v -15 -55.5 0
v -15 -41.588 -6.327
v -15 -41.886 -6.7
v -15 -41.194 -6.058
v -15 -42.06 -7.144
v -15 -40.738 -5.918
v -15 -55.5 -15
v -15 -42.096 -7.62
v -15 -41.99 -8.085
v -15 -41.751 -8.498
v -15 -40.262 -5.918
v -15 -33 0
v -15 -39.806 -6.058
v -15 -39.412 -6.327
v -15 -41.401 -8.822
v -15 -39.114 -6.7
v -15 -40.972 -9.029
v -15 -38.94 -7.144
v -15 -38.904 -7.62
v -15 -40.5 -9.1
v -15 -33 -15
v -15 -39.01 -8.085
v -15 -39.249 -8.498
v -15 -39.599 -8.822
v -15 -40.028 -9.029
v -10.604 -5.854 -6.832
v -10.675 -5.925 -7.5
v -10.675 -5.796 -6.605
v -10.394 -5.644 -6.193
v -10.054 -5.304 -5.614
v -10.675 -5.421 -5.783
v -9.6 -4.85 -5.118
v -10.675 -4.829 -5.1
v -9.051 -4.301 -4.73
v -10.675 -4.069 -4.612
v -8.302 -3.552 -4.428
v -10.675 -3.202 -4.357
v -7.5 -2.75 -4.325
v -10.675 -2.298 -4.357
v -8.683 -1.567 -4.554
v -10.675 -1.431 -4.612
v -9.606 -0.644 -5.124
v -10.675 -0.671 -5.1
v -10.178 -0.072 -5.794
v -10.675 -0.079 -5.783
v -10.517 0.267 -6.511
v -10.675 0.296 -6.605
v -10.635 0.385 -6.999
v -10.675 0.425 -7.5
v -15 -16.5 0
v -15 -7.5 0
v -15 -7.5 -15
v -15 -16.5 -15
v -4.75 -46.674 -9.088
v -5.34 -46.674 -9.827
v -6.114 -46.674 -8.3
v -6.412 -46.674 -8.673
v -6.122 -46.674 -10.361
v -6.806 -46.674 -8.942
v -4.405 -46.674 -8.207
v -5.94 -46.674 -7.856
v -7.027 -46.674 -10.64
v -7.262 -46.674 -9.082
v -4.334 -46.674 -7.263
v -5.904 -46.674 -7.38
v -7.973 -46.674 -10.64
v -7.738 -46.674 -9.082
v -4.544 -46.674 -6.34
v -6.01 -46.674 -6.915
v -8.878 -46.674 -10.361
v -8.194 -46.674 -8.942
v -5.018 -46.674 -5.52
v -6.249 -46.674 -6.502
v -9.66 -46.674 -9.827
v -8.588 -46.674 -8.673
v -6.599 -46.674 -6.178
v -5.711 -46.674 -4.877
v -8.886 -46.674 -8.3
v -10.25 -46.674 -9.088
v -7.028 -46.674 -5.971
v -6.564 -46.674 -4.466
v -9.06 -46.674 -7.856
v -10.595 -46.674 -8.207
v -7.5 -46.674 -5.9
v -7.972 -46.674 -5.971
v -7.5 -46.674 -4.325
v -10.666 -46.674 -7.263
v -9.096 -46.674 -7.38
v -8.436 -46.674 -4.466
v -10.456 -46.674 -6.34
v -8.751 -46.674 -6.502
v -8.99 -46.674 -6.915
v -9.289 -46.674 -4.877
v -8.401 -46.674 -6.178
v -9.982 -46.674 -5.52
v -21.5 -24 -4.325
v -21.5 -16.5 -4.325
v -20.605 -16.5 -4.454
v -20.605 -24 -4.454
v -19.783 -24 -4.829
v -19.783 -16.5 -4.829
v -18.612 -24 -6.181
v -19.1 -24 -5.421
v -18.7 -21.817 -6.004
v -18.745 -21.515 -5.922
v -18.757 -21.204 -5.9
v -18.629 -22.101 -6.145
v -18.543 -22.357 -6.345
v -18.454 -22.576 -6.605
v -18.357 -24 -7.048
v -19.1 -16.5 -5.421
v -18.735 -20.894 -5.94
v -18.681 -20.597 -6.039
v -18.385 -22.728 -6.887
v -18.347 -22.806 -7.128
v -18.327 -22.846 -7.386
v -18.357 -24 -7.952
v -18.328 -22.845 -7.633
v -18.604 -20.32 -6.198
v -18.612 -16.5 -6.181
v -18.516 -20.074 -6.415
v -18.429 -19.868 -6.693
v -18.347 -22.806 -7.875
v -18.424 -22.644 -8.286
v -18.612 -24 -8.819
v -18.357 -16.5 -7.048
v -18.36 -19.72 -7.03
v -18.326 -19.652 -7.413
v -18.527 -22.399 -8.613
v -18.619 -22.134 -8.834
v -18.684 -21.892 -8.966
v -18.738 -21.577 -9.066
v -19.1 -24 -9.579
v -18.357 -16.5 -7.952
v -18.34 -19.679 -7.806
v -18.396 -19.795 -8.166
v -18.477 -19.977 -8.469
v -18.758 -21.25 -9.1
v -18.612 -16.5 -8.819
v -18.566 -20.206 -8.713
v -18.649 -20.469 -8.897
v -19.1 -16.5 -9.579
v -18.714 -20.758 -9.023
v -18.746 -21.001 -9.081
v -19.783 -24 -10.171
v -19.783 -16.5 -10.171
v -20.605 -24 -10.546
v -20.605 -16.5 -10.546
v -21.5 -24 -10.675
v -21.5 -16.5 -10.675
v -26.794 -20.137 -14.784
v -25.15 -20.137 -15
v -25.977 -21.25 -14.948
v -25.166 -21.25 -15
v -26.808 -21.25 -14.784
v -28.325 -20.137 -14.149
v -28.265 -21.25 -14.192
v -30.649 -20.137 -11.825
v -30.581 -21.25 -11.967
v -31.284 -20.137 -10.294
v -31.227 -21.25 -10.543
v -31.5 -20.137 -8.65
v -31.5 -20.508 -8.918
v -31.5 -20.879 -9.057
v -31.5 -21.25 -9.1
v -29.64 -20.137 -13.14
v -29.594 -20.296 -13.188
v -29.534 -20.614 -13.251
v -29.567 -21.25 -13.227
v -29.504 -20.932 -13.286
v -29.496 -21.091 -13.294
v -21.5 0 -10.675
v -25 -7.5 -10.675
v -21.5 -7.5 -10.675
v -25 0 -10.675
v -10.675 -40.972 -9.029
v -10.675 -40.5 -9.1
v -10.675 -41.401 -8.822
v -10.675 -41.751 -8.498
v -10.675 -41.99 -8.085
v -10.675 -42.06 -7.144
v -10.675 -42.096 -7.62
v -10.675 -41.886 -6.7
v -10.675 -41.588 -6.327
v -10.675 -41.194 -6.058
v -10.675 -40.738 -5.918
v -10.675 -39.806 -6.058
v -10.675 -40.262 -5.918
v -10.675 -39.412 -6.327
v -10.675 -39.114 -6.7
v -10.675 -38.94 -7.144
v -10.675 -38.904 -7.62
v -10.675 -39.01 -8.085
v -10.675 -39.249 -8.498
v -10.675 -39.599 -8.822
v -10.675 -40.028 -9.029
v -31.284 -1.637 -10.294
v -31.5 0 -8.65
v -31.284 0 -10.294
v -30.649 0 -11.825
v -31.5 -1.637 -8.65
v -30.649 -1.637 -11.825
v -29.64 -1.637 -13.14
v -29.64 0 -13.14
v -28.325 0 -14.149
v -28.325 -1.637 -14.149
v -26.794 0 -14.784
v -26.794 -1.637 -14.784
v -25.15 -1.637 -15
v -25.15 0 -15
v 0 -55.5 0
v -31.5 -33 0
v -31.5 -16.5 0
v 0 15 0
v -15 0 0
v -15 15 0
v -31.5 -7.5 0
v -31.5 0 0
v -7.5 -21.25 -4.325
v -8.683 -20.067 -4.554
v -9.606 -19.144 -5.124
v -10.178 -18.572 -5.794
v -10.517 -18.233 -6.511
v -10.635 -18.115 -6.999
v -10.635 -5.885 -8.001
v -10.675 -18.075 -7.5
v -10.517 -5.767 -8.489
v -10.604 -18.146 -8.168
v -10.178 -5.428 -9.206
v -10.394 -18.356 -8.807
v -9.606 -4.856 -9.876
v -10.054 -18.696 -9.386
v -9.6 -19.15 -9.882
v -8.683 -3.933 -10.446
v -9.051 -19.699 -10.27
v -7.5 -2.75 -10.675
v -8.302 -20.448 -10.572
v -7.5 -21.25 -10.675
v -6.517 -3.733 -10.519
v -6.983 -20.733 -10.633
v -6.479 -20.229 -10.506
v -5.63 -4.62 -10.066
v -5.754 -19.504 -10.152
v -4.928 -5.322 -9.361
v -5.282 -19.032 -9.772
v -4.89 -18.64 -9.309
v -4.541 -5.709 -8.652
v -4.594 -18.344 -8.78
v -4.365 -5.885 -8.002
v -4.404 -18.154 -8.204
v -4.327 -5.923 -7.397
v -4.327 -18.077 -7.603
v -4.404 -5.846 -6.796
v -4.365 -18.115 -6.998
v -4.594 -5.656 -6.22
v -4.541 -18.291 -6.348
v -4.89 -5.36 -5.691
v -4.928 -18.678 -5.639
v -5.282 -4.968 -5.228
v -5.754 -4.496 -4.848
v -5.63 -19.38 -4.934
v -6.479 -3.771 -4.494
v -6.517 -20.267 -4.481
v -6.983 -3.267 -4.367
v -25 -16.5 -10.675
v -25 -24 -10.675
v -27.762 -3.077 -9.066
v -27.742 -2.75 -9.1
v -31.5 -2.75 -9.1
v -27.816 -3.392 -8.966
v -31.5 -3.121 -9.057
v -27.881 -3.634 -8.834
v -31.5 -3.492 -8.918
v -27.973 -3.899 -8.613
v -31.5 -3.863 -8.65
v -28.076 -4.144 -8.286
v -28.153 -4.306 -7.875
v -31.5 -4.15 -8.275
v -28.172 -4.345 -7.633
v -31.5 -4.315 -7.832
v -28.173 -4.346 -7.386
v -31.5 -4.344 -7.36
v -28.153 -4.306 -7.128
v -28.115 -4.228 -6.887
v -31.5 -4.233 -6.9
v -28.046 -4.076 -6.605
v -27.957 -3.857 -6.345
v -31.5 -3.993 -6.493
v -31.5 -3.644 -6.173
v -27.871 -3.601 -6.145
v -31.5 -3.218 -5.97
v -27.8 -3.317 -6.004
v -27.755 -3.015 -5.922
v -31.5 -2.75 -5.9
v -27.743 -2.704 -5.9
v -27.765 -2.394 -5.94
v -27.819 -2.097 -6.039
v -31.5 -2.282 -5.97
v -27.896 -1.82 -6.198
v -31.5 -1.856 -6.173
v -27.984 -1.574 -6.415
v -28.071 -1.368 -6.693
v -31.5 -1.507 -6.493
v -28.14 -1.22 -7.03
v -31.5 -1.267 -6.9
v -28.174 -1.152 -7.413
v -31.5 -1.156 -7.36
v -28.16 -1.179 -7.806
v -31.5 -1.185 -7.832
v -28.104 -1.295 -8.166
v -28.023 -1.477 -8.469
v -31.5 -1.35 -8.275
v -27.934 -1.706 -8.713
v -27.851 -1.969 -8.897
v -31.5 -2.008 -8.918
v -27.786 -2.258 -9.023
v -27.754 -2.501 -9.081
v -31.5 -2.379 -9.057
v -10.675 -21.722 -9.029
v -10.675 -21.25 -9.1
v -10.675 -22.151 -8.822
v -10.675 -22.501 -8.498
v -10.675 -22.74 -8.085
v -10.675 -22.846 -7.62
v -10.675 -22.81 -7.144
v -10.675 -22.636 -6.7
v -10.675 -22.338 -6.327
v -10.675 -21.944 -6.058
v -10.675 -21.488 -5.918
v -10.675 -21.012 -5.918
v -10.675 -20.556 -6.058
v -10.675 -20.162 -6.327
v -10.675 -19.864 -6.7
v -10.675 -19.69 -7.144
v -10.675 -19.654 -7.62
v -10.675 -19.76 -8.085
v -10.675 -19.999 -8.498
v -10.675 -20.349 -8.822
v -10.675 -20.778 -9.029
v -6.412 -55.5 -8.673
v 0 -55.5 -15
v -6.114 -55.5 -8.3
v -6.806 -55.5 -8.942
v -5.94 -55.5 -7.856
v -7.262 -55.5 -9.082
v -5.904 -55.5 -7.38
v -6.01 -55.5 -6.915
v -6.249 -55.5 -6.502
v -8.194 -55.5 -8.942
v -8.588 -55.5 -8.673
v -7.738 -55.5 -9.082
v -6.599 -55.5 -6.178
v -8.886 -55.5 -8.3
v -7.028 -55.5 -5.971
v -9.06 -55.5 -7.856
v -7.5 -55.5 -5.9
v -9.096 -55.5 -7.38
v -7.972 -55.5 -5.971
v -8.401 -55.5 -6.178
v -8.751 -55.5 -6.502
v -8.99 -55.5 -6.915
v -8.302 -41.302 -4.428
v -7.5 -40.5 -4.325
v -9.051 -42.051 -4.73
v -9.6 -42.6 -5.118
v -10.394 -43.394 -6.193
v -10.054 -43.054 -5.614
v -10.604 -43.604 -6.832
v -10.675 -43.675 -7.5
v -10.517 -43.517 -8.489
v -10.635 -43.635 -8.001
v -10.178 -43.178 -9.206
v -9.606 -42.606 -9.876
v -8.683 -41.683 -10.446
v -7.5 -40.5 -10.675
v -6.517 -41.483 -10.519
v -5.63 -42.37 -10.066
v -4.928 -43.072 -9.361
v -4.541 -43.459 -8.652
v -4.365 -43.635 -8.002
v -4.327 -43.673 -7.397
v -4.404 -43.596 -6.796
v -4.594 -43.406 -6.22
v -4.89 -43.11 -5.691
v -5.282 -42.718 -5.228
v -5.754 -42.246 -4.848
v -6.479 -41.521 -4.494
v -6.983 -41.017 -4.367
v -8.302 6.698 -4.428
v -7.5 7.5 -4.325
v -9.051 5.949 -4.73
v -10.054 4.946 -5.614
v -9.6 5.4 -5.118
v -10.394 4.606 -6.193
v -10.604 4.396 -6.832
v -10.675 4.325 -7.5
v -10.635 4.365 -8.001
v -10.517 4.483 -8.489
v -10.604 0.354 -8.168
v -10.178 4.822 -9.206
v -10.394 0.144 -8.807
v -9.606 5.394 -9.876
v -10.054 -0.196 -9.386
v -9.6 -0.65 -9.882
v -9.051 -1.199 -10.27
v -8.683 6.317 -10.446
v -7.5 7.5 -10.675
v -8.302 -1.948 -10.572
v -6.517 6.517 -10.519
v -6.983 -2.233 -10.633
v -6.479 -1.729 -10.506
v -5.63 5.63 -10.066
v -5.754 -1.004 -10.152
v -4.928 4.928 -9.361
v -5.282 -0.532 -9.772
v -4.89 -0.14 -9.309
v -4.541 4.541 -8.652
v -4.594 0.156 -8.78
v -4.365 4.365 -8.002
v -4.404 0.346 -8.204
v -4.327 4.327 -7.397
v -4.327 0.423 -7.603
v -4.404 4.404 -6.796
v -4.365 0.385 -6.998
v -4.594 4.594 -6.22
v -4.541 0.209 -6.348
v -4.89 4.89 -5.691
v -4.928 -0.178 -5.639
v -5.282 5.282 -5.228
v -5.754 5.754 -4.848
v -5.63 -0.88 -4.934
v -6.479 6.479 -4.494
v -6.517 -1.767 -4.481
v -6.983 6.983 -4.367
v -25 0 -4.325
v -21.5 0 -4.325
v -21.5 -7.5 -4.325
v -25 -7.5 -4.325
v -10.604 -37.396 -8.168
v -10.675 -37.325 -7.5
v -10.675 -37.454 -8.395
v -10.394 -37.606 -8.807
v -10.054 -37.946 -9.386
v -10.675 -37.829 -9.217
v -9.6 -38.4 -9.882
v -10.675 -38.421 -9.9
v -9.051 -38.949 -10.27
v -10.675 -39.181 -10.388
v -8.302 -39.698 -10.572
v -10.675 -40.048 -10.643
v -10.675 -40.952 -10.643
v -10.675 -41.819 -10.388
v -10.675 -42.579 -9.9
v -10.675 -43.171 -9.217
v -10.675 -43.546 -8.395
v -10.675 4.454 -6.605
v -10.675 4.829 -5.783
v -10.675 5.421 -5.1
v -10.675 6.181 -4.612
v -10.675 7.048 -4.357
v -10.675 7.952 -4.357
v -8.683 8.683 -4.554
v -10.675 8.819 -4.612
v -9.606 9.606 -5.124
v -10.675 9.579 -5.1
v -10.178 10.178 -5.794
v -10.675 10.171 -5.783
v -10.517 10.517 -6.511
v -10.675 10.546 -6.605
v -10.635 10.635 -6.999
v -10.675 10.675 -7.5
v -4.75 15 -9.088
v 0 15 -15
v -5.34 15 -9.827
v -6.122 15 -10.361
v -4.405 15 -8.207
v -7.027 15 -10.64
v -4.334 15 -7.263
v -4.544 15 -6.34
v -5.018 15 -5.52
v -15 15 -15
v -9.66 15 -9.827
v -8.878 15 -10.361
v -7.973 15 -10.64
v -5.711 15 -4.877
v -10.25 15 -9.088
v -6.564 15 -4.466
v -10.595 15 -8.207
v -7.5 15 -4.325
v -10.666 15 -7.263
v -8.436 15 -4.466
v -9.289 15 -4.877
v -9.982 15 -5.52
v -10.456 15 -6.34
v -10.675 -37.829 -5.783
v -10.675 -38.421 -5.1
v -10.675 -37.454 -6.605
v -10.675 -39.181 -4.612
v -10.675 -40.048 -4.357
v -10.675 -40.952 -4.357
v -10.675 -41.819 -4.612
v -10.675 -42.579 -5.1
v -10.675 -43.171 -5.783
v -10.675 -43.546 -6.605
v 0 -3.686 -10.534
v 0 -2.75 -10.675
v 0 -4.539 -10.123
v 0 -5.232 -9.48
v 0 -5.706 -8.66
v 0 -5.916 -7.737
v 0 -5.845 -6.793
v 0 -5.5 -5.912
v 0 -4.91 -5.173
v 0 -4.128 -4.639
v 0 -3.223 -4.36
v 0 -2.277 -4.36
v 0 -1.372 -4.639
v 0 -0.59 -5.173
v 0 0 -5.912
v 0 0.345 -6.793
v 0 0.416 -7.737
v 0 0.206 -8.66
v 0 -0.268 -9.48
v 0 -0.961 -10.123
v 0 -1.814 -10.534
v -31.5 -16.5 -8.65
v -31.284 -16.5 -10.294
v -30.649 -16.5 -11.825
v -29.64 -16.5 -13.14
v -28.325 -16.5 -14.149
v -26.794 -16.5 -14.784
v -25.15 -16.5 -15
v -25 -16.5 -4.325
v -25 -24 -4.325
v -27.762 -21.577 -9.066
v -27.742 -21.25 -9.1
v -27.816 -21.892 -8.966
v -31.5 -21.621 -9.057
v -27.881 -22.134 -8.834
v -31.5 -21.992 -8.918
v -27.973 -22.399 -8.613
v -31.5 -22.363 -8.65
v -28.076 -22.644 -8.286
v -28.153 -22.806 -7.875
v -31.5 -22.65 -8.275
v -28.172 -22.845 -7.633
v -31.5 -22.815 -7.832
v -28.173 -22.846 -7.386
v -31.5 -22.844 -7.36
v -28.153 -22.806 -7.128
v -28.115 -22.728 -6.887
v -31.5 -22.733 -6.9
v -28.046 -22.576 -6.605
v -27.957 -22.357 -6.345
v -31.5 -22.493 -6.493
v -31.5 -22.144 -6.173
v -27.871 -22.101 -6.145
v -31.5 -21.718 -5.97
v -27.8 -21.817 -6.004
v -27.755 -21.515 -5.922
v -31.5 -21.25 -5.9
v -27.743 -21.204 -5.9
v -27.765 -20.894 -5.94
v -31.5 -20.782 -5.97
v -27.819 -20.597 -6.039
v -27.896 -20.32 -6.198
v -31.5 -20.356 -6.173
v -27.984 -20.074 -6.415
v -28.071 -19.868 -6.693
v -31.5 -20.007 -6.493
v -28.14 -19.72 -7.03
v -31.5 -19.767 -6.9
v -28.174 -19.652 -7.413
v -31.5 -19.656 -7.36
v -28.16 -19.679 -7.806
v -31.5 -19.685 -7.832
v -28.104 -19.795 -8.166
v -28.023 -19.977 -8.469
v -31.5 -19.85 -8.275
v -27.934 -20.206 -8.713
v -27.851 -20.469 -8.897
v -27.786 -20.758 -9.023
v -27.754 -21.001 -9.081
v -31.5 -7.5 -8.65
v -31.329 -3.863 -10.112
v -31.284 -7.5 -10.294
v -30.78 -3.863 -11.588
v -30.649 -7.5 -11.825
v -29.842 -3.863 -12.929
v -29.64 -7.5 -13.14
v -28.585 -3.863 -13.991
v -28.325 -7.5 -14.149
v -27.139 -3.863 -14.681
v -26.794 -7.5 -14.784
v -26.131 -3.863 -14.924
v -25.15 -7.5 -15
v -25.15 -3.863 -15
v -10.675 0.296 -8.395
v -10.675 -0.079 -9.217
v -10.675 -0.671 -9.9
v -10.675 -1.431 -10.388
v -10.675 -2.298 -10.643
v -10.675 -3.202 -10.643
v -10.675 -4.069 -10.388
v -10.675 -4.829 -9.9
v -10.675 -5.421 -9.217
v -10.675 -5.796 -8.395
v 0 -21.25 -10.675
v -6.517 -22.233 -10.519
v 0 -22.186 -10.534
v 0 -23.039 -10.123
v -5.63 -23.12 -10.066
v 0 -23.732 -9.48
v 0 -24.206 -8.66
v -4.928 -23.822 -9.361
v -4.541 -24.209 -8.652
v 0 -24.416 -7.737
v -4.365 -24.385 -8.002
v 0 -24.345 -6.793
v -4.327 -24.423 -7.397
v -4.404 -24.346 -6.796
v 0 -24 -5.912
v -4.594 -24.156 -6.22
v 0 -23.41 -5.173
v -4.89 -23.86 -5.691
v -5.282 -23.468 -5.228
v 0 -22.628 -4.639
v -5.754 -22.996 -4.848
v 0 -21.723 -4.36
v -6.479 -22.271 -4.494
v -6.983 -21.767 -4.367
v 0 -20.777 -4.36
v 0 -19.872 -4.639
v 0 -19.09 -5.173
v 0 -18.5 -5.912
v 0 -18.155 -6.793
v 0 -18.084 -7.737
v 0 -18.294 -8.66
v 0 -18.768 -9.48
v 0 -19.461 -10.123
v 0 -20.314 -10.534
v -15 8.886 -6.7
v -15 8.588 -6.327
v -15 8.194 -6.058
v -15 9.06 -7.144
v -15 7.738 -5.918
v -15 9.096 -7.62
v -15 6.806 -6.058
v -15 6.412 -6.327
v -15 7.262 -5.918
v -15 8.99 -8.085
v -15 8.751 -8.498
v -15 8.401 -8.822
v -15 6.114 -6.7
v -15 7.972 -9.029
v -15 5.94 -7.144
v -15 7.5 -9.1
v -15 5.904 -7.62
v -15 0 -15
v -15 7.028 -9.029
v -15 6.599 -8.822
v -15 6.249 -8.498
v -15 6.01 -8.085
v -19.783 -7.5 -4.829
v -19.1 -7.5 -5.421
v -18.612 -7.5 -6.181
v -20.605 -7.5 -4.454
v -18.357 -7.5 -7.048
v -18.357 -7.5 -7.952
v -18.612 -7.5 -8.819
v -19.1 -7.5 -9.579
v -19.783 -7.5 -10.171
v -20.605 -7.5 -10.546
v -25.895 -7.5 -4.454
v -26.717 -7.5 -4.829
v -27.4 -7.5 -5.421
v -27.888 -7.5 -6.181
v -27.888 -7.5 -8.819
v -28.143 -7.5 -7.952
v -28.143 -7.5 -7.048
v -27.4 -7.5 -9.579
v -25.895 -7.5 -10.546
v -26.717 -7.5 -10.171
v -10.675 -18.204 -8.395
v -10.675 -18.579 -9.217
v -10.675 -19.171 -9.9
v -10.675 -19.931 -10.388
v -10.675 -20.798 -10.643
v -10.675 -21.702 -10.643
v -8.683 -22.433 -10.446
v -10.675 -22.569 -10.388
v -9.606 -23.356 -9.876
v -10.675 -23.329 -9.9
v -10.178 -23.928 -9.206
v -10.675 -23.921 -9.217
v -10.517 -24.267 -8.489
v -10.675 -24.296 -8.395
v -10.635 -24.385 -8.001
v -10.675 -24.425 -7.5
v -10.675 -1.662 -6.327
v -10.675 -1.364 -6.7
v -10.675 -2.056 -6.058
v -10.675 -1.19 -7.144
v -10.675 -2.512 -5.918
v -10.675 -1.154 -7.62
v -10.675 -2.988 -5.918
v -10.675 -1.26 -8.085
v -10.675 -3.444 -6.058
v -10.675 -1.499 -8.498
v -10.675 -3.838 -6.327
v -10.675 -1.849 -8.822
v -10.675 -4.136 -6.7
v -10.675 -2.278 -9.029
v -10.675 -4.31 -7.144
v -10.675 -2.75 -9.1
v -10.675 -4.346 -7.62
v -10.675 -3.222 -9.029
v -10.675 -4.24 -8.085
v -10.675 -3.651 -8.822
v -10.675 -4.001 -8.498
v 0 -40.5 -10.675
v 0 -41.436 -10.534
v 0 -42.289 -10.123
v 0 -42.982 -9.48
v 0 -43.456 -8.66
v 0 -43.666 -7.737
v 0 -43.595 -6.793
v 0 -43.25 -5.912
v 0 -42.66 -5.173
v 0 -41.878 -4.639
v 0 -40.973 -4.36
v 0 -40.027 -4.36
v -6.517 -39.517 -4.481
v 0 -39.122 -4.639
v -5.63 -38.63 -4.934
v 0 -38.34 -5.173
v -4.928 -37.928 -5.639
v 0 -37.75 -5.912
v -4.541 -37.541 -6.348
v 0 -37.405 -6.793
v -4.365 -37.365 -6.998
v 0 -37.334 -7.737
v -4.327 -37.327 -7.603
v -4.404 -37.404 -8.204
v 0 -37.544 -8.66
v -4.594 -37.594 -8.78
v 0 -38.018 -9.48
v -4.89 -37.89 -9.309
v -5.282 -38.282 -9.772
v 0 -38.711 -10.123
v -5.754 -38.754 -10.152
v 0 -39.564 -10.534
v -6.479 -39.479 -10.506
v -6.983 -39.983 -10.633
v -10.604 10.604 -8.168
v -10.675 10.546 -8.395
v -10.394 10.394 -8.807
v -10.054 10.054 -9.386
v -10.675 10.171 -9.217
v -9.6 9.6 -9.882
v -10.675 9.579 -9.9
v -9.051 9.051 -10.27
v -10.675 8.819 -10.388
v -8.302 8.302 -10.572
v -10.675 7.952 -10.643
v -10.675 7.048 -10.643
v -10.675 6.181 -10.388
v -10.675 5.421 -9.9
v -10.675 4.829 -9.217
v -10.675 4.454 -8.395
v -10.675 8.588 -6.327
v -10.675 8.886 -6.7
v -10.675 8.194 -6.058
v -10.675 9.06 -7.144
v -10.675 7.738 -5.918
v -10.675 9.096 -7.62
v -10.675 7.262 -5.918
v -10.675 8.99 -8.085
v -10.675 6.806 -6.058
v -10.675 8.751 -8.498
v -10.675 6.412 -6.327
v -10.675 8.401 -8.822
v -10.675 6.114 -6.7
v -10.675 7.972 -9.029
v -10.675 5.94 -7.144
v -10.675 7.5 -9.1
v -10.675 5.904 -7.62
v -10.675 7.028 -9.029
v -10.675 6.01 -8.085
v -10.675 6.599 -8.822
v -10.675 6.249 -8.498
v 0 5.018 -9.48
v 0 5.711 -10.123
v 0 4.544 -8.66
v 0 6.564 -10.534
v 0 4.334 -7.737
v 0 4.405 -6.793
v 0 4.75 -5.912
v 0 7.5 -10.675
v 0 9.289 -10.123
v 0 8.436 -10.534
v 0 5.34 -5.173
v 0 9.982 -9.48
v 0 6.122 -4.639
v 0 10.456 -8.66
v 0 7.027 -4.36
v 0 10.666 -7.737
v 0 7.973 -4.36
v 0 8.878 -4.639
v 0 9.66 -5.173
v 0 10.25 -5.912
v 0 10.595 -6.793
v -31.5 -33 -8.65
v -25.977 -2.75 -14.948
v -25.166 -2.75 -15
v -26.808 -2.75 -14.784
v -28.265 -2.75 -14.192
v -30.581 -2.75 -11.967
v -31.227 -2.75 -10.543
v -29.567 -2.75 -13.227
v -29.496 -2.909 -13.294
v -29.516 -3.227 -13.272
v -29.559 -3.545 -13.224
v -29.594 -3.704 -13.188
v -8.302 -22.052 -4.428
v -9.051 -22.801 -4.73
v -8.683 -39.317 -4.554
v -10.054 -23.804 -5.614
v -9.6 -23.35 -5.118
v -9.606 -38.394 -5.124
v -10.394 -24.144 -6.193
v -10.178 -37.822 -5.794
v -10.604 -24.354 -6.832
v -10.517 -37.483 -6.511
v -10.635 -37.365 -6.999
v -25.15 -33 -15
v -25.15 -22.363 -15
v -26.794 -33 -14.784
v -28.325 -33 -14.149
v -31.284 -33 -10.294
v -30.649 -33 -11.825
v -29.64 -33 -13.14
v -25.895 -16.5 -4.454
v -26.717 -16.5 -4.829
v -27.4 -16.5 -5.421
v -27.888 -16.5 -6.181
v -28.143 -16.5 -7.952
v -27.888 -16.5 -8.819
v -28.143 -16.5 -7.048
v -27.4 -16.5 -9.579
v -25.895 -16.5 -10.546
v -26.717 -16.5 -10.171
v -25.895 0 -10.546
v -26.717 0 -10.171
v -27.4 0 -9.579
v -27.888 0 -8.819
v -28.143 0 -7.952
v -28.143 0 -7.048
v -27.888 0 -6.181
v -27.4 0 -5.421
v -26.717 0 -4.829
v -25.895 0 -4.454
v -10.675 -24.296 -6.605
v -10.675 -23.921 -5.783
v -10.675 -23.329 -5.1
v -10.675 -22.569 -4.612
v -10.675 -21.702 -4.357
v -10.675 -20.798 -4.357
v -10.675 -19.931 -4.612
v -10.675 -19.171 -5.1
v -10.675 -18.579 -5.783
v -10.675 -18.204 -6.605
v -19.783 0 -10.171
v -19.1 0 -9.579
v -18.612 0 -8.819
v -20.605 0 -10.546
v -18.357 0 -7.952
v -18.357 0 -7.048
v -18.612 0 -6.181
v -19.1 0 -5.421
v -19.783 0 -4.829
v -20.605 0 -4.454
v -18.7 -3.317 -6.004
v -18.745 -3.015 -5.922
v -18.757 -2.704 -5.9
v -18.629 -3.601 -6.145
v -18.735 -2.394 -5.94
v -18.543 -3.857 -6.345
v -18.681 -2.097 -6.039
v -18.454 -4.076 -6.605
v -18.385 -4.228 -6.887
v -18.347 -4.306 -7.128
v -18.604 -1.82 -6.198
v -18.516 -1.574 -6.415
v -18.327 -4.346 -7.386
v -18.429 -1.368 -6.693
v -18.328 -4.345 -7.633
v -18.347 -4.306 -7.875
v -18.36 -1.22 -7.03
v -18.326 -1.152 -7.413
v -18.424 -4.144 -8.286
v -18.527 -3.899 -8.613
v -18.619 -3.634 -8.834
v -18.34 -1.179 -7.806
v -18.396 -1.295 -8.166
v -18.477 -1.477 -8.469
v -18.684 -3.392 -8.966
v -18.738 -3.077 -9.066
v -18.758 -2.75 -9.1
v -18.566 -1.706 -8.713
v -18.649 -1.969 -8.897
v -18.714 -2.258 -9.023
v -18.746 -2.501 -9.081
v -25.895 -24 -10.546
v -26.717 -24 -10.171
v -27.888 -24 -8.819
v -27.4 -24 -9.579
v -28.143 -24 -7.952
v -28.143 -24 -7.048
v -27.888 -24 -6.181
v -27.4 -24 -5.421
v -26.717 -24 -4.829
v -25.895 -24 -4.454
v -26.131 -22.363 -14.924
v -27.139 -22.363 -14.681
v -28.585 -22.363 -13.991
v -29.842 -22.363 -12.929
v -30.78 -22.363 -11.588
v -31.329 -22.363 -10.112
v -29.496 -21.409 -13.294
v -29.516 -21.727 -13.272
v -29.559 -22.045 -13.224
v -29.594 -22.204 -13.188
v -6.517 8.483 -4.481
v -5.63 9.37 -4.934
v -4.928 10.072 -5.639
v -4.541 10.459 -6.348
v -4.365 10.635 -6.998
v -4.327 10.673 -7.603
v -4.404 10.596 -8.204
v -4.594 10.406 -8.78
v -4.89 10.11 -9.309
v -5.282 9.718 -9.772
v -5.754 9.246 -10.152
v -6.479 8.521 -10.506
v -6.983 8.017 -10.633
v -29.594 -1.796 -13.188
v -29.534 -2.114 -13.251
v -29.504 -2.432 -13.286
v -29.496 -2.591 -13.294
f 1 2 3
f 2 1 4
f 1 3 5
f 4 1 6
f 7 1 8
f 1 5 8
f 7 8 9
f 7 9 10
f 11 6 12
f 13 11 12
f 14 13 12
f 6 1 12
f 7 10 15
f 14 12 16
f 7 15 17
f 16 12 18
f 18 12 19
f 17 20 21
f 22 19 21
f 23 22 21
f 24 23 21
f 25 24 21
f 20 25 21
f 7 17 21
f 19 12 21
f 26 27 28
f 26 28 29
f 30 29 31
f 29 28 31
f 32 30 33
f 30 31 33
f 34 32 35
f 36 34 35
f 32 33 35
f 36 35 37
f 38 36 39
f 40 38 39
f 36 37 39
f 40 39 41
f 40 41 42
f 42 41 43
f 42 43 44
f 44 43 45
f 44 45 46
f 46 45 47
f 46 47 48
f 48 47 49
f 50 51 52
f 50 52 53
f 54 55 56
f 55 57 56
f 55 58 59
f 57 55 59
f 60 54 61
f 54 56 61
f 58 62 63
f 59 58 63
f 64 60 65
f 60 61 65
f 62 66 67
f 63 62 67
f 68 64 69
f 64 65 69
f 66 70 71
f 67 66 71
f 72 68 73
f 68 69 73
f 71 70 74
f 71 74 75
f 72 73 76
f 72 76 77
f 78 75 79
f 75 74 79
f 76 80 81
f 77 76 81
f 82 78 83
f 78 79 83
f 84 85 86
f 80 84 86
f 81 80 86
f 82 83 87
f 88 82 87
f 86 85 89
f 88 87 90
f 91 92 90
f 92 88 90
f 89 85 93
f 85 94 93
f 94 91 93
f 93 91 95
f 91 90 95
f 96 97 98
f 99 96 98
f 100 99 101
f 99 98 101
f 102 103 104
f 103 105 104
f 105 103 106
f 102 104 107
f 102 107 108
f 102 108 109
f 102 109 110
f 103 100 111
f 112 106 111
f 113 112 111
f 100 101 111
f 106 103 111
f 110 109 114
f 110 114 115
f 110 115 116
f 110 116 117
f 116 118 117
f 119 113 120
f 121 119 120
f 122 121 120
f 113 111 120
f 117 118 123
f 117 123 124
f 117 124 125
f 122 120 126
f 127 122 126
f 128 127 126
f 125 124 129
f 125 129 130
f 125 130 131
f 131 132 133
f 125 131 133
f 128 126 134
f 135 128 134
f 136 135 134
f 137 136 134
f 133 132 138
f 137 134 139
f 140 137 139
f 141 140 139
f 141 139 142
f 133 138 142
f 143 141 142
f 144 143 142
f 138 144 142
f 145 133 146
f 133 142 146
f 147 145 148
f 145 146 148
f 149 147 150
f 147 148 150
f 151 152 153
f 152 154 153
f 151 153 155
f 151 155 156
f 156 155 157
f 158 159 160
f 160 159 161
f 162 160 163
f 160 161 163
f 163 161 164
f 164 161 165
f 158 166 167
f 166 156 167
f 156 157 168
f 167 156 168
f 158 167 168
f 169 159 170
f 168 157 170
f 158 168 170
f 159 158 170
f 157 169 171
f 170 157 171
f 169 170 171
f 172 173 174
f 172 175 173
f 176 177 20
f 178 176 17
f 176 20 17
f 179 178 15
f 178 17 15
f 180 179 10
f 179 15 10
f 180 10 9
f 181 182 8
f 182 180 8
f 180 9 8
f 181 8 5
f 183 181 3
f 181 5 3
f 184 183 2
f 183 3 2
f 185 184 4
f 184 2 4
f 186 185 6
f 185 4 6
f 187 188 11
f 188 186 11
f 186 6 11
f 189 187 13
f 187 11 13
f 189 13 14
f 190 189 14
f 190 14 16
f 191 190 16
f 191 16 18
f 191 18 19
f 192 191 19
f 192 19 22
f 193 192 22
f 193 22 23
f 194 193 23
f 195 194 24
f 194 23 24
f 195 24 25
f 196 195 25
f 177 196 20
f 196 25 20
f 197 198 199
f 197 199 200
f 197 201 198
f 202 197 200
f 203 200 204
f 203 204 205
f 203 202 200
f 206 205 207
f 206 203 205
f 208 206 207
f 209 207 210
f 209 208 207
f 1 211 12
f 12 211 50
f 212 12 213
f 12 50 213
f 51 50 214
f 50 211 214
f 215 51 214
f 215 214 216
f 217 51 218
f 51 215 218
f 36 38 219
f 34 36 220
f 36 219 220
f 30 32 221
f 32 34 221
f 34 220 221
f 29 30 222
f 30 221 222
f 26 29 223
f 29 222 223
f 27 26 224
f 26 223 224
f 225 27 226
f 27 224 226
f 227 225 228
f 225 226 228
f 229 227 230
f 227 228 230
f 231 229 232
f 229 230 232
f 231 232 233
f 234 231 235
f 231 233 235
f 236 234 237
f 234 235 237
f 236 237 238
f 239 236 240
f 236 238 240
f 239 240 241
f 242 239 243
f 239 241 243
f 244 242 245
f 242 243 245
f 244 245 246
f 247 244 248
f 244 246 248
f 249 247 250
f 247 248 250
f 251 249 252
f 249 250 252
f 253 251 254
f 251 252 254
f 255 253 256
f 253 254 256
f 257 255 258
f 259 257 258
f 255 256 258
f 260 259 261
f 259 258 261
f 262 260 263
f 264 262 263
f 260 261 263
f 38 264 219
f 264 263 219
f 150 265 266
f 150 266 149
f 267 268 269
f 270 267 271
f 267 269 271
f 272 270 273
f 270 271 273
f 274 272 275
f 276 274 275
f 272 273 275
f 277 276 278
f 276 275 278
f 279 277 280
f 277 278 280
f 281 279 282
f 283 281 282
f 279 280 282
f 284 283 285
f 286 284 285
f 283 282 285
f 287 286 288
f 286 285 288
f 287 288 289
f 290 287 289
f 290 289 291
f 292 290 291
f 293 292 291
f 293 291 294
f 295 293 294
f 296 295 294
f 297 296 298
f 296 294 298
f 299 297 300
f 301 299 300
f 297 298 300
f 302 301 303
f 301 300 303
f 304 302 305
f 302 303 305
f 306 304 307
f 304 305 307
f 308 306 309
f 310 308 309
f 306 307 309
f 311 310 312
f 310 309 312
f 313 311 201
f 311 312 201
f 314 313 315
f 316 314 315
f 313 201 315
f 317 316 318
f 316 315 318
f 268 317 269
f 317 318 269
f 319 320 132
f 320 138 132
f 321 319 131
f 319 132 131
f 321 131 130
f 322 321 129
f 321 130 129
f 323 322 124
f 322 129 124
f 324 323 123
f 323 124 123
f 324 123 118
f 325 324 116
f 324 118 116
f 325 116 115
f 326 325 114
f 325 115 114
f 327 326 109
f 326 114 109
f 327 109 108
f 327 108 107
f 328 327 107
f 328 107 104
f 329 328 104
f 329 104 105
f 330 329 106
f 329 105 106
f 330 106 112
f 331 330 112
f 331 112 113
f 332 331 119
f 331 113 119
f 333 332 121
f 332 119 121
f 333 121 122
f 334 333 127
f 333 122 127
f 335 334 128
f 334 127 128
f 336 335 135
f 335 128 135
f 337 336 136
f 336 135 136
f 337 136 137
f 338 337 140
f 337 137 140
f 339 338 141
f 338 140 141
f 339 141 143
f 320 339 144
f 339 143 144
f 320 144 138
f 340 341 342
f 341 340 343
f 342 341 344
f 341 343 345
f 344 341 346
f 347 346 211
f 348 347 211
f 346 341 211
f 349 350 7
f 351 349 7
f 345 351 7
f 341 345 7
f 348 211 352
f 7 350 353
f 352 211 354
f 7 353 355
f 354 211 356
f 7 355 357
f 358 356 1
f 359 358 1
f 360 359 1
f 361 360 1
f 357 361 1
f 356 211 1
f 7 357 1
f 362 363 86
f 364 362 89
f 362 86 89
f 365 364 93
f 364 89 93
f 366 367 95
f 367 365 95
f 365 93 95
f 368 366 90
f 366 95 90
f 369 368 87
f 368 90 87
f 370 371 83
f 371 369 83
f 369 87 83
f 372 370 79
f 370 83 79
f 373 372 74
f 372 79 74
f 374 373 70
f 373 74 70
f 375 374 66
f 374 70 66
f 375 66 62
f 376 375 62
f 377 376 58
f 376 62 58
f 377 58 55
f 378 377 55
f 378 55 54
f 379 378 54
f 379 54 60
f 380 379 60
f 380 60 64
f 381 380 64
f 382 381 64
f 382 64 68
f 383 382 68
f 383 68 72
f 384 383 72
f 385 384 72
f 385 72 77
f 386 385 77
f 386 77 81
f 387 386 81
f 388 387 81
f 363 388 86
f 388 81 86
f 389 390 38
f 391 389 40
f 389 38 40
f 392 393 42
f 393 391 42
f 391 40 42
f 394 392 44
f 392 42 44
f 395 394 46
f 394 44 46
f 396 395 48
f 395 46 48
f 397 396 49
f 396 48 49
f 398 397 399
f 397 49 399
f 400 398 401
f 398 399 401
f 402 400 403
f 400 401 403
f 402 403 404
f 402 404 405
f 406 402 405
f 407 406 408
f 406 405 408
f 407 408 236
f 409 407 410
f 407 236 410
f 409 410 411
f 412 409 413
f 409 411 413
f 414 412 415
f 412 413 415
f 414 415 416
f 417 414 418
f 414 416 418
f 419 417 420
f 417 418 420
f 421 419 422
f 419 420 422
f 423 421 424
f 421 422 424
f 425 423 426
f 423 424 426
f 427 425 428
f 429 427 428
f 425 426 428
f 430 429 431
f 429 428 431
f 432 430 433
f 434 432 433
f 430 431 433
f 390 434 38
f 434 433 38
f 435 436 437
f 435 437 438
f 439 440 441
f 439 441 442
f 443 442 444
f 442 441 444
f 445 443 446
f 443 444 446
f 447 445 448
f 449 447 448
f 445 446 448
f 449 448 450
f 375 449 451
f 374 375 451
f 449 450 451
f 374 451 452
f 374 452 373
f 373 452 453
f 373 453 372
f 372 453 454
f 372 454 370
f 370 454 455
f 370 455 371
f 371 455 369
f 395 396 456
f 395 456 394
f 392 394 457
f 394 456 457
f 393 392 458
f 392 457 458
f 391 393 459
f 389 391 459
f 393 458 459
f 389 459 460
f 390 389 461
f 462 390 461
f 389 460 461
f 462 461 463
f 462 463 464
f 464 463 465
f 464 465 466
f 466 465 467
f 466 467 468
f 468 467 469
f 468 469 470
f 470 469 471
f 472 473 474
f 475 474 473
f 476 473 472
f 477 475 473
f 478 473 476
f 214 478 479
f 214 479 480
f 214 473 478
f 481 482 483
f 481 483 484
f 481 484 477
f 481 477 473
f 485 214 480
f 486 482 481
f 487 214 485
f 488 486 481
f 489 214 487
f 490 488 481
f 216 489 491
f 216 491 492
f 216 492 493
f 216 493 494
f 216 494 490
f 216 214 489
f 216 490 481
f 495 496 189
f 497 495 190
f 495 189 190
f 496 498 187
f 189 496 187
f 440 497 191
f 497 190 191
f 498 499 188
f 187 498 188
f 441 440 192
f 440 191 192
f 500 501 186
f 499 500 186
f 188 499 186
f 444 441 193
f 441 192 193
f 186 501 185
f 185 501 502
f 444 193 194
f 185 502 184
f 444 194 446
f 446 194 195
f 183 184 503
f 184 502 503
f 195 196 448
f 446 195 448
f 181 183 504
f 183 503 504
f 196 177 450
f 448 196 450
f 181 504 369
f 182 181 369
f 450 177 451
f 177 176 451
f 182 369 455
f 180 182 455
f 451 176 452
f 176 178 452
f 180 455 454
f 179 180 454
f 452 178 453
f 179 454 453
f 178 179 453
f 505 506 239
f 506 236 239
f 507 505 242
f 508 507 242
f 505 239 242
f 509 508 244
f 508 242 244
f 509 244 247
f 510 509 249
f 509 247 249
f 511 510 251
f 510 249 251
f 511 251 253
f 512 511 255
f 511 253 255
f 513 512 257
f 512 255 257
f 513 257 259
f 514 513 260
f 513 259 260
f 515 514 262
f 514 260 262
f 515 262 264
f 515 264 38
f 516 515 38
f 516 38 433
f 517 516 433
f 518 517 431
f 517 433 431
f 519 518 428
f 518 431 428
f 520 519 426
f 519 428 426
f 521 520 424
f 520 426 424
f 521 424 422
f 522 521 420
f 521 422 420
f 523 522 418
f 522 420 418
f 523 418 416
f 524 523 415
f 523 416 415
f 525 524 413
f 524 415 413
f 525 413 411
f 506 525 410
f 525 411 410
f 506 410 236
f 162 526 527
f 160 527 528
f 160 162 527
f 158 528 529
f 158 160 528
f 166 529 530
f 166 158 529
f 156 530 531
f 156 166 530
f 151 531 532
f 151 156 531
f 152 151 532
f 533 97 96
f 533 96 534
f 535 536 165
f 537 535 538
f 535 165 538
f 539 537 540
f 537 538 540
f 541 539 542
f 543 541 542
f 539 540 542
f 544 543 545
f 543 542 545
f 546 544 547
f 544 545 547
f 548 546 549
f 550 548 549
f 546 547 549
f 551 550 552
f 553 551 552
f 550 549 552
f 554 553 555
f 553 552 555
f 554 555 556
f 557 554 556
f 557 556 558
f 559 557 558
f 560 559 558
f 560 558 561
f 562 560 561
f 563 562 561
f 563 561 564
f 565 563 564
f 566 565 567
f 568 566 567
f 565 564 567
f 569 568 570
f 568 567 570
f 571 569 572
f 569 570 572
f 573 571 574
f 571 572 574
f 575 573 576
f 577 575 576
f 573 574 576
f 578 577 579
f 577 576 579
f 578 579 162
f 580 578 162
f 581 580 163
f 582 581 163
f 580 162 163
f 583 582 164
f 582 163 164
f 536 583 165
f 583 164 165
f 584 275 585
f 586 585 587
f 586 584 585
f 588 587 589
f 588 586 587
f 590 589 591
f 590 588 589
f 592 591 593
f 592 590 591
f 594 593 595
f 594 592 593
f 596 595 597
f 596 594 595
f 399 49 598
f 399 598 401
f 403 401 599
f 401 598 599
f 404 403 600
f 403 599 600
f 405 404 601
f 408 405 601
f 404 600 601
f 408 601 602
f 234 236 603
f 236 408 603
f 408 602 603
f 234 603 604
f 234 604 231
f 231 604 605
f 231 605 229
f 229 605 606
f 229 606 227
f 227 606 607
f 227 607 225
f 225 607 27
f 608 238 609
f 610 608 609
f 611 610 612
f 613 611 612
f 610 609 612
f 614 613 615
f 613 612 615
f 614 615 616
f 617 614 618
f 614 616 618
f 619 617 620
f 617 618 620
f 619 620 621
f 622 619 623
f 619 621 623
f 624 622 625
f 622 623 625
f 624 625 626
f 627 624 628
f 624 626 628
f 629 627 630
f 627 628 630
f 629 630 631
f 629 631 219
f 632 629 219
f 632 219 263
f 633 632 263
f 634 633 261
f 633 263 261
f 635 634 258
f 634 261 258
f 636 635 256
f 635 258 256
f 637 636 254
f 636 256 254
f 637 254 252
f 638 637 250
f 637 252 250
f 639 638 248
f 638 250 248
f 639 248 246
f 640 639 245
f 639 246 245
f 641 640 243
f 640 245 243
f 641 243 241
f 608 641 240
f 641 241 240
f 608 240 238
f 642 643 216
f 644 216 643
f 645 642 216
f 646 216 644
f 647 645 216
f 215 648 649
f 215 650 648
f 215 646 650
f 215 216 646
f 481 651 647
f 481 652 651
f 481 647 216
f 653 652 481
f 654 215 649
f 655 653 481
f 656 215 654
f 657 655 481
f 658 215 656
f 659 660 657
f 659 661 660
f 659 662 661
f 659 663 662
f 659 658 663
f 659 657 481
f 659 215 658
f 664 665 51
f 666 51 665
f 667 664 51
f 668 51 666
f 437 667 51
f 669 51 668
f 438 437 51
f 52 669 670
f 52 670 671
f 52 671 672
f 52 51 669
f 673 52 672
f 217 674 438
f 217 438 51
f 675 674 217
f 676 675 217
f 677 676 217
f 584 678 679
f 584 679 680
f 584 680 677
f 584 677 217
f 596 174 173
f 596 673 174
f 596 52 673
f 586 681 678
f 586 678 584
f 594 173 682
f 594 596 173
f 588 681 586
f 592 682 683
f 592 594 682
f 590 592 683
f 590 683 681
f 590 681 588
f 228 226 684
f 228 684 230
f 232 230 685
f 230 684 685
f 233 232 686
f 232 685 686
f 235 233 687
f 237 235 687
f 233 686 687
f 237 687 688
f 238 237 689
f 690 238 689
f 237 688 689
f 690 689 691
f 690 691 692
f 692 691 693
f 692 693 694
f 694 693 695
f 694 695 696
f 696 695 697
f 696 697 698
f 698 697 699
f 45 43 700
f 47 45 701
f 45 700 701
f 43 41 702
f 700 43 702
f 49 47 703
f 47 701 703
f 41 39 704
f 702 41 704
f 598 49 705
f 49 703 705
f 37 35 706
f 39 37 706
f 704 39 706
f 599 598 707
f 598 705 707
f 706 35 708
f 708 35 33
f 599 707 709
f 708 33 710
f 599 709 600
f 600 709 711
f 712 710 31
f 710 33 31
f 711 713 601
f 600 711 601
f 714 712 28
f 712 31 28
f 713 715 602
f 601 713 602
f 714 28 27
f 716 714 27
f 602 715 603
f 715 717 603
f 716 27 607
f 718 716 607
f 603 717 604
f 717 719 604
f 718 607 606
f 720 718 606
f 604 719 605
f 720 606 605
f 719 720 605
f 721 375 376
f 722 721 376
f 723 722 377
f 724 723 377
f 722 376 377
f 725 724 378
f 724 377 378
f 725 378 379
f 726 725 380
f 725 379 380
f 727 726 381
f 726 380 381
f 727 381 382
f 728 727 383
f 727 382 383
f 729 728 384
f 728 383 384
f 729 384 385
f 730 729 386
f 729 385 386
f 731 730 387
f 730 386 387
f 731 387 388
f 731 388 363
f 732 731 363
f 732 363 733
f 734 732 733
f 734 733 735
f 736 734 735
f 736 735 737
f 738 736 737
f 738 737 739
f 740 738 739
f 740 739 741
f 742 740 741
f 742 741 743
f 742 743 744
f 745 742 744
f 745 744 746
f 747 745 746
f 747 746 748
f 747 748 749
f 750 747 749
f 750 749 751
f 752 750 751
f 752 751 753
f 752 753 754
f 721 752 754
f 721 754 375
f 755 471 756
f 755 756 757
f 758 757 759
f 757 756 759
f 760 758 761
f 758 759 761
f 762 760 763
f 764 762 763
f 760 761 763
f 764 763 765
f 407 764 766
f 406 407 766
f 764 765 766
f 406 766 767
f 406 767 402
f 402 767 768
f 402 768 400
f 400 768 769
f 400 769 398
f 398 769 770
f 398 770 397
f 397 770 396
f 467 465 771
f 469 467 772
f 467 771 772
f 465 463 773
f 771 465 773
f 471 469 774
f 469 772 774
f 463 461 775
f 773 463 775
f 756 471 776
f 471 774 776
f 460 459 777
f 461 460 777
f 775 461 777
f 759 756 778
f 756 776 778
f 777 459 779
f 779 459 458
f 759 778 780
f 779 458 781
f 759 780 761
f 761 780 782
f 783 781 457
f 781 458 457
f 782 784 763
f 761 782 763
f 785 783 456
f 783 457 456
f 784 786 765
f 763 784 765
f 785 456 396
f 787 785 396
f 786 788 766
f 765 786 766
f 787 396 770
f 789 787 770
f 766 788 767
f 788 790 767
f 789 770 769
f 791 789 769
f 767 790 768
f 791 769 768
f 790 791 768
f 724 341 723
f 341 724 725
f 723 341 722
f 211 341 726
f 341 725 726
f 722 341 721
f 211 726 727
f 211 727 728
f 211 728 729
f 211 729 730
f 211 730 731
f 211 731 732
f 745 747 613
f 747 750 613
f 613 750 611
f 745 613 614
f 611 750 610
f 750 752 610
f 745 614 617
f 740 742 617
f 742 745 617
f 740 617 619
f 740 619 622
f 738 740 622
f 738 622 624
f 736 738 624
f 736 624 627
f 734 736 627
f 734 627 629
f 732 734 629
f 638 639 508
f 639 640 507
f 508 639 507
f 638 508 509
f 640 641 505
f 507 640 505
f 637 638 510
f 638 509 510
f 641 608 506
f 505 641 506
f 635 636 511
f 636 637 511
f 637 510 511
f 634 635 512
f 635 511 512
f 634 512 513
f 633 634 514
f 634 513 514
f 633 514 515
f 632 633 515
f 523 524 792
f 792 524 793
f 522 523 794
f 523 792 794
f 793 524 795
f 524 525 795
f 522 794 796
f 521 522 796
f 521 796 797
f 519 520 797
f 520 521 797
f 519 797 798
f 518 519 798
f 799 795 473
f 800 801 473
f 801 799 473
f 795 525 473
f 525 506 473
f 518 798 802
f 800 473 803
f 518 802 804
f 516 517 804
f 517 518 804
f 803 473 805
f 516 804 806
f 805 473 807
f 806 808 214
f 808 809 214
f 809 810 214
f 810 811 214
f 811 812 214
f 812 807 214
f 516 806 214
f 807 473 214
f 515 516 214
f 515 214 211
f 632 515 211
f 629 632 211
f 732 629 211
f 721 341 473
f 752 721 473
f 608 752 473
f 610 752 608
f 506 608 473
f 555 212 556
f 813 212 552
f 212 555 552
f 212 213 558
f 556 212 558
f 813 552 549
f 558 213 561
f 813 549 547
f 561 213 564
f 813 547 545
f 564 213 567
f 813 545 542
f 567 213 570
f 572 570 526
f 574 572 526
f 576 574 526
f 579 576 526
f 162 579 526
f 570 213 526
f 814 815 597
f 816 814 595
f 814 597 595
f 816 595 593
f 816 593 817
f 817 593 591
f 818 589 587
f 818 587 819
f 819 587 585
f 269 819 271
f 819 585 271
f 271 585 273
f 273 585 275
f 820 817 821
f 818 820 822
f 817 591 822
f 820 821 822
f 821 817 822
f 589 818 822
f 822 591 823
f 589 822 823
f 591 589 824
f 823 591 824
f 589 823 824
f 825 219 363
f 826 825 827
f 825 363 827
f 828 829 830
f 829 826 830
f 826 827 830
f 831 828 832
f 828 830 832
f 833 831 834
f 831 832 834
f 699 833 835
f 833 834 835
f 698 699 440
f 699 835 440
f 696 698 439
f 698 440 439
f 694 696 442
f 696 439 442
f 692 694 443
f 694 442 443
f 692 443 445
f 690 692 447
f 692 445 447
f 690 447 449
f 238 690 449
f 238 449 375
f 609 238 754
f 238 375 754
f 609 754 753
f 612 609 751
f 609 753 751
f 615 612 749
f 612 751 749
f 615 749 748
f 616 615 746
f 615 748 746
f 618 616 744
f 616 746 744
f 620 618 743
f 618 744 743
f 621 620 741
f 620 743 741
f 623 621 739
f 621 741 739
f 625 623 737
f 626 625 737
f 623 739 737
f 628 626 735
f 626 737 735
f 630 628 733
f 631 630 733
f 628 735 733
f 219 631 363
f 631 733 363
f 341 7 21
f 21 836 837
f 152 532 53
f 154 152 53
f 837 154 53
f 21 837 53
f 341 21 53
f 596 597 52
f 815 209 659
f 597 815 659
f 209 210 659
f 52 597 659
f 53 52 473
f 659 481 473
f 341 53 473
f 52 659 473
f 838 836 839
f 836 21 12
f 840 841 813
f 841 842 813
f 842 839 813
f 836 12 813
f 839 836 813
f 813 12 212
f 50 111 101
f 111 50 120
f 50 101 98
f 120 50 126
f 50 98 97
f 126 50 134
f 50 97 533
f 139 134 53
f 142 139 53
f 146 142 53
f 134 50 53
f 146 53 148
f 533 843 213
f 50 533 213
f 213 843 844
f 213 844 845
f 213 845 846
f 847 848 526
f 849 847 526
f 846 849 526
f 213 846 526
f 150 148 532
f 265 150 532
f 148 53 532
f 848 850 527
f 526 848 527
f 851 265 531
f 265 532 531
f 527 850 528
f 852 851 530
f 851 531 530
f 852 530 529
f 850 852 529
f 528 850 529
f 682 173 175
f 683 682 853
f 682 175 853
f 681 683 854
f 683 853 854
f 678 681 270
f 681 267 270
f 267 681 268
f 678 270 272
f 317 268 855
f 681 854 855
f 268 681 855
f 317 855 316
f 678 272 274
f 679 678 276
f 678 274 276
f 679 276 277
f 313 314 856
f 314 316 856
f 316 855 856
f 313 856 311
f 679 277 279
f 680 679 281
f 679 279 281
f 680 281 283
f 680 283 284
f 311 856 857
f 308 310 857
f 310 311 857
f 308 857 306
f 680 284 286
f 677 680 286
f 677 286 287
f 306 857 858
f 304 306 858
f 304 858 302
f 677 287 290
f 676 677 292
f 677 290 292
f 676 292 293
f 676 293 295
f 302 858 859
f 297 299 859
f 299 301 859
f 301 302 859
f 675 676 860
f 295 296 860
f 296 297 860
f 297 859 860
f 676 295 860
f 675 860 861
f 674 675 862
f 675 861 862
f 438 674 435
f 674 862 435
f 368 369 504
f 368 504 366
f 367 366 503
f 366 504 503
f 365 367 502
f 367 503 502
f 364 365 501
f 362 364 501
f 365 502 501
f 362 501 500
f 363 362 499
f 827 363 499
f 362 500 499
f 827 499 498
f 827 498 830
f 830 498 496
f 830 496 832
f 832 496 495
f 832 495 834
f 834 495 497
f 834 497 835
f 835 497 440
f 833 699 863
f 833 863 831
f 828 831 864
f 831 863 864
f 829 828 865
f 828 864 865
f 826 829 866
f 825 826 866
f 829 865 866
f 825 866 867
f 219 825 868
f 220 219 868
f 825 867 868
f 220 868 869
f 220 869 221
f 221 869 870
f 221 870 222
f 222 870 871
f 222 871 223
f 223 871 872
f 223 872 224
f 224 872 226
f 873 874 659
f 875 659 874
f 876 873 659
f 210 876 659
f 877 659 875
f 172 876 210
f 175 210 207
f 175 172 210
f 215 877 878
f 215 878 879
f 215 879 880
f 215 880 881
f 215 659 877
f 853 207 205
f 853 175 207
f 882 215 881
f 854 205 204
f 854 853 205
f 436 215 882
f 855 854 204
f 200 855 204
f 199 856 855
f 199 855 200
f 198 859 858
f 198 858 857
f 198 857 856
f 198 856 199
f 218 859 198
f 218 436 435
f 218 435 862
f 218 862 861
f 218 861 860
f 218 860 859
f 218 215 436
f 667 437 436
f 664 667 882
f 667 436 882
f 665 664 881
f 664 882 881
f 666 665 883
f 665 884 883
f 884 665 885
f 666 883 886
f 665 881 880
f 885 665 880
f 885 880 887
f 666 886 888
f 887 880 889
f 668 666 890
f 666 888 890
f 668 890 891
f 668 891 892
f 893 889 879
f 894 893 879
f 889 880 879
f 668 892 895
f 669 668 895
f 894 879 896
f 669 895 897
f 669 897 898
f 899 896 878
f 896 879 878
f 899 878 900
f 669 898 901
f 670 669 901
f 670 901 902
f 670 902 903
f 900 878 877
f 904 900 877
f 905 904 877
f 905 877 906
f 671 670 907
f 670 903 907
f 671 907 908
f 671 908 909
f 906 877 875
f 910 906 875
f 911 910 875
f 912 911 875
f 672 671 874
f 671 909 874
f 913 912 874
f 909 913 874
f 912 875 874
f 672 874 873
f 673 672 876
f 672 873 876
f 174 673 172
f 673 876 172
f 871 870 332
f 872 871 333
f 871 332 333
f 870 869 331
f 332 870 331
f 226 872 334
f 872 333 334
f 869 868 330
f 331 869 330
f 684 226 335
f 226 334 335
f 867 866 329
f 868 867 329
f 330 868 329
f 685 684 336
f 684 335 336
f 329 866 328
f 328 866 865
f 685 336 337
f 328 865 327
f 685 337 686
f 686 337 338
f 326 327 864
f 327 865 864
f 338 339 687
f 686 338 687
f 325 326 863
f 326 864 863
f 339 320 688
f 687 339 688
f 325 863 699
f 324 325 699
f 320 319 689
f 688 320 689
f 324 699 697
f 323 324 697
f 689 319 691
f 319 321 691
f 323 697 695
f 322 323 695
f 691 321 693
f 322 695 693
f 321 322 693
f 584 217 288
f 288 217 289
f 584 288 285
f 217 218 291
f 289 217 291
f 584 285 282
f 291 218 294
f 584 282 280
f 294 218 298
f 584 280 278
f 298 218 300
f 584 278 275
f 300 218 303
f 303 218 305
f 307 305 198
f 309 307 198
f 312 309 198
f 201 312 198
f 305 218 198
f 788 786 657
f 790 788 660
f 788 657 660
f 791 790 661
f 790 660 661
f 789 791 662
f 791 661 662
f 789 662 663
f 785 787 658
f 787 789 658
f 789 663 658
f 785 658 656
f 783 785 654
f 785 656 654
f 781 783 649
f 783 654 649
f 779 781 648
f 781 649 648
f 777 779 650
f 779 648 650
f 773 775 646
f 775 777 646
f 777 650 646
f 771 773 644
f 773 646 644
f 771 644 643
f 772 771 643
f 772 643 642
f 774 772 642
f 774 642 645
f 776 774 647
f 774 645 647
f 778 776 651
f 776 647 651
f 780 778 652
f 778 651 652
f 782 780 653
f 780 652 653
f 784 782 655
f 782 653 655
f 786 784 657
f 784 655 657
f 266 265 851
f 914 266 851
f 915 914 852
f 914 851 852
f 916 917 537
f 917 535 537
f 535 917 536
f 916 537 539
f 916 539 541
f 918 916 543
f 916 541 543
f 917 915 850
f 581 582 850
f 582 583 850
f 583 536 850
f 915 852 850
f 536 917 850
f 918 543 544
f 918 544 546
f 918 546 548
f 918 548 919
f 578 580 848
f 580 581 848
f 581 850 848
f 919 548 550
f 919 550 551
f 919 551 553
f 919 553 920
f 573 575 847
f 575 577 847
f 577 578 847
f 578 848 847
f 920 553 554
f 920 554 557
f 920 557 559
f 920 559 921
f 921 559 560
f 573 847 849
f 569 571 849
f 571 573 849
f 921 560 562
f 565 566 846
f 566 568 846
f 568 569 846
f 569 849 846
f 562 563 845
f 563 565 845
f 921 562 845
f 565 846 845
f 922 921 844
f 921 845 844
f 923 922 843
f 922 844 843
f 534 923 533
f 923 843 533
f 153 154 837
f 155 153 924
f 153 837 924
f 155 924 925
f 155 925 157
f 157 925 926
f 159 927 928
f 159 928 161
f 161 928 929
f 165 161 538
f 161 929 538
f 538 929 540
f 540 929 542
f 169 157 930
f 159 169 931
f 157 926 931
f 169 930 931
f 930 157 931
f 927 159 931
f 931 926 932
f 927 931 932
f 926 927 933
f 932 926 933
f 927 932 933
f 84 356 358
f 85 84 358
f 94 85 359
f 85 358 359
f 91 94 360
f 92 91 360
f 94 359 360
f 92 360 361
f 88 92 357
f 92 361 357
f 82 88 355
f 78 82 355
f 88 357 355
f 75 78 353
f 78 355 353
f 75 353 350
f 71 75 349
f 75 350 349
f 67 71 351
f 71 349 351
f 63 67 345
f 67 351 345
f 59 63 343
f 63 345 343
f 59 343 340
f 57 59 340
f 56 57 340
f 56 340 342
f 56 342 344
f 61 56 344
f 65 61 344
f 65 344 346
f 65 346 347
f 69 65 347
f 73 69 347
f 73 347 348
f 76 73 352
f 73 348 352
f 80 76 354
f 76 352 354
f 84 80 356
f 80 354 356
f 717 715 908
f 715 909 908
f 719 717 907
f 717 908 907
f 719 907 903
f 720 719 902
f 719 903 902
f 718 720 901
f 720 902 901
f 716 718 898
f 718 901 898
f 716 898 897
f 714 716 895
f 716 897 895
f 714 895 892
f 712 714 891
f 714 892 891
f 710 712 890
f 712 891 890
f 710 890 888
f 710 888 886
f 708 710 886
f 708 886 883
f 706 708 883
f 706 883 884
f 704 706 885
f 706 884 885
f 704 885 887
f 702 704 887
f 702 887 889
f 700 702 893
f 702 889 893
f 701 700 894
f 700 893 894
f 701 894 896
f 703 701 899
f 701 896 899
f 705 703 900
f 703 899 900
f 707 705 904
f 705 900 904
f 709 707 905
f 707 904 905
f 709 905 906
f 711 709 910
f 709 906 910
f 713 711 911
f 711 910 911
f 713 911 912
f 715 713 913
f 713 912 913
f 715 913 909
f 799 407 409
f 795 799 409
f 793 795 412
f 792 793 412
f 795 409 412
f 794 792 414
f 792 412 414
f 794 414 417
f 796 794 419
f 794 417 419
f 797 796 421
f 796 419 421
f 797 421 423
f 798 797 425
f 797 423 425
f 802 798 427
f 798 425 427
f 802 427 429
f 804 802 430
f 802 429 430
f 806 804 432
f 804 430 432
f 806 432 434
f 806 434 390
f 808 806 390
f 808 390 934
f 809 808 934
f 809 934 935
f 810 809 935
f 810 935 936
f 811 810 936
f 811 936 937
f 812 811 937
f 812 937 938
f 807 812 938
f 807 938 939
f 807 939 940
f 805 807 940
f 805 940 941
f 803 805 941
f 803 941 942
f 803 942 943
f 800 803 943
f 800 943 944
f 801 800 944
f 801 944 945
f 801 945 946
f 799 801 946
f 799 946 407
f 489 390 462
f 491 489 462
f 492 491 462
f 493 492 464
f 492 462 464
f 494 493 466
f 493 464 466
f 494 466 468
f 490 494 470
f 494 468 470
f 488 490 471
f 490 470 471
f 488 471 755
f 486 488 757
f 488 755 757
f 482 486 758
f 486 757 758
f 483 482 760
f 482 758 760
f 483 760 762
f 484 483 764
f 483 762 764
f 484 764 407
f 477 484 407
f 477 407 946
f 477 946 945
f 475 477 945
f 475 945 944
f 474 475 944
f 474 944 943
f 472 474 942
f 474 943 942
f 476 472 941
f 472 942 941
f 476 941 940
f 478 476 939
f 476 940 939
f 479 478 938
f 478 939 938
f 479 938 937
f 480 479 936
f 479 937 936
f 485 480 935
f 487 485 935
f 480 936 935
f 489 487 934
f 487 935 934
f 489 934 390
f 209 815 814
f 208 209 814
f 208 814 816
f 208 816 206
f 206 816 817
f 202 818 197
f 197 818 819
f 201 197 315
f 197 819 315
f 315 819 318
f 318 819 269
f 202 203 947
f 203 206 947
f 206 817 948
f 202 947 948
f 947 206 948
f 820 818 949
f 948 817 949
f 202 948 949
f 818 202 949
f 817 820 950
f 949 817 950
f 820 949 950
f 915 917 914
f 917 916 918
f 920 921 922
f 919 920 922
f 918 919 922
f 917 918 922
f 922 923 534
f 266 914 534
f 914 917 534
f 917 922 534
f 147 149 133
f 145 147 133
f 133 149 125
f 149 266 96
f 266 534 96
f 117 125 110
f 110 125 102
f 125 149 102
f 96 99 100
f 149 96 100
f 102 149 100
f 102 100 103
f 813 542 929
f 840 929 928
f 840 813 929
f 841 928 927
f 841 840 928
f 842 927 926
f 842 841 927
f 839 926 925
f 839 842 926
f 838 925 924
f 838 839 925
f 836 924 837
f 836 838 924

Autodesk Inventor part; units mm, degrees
ref_plane "YZ Plane" through (0, 0, 0) normal (1, 0, 0) x (0, 1, 0)
ref_plane "XZ Plane" through (0, 0, 0) normal (0, 1, 0) x (-1, 0, 0)
ref_plane "XY Plane" through (0, 0, 0) normal (0, 0, 1) x (1, 0, 0)
sketch "Base Profile" plane through (0, 0, 0) normal (0, 1, 0) x (-1, 0, 0)
  line L0 (0, 0) -> (15, 0)
  line L1 (15, 0) -> (15, -15)
  line L2 (15, -15) -> (0, -15)
  line L3 (0, -15) -> (0, 0)
  line L4 (15, 0) -> (31.5, 0)
  line L5 (31.5, 0) -> (31.5, -15)
  line L6 (31.5, -15) -> (15, -15)
  line L7 (15, -15) -> (15, 0)
  dimension "d164" = 15
  dimension "d165" = 15
  dimension "d166" = 16.5
  dimension "d167" = 15
extrude "Stock" add sketch "Base Profile" against normal blind 33
extrude "Top Extrusion Post" add sketch "Base Profile" along normal blind 15 contours L0 L1 L2 L3
extrude "Lower Extrusion Post" add sketch "Base Profile" against normal blind 22.5 from surface at -33 contours L0 L1 L2 L3
sketch "Sketch27" plane through (0, -33, -15) normal (0, 0, -1) x (-1, 0, 0)
  line L0 (0, -22.5) -> (0, 48)
  line L1 (31.5, 0) -> (15, 0)
  line L2 (31.5, 33) -> (31.5, 0)
  line L3 (15, 33) -> (31.5, 33)
  line L4 (15, 33) -> (15, 48)
  line L5 (0, 48) -> (15, 48)
  line L6 (0, 25.5) -> (31.5, 25.5)
  line L7 (0, 16.5) -> (31.5, 16.5)
  line L8 (15, 33) -> (15, 0)
  line L9 (0, -22.5) -> (15, -22.5)
  line L10 (15, 0) -> (15, -22.5)
  point P0 (15, 25.5)
  point P1 (15, 16.5)
  dimension "d373" = 7.5
  dimension "d374" = 16.5
extrude "Lower Half Cut" cut sketch "Sketch27" against normal through all contours L8 L6 L2 L7
sketch "Bottom Profile" plane through (-35, -33, -15) normal (0, -1, 0) x (1, 0, 0)
  line L0 (13.5, 7.5) -> (10, 7.5) construction
  line L1 (13.5, 10.675) -> (10, 10.675)
  line L2 (10, 4.325) -> (13.5, 4.325)
  arc A0 (13.5, 4.325) -> (13.5, 10.675) centre (13.5, 7.5) ccw
  arc A1 (10, 10.675) -> (10, 4.325) centre (10, 7.5) ccw
  line L3 (3.5, 15) -> (3.5, 0)
  line L4 (35, 15) -> (3.5, 15)
  point P0 (11.75, 7.5)
  dimension "d291" = 3.5
  dimension "d292" = 6.35
  dimension "d293" = 6.5
  dimension "d294" = 7.5
extrude "Slot Cut" cut sketch "Bottom Profile" along normal blind 24 from surface at -33
sketch "Front Hole Pattern" plane through (0, -33, 0) normal (1, 0, 0) x (0, 0, -1)
  line L0 (0, 0) -> (0, 48) construction
  circle A0 centre (7.5, 40.5) radius 3.175
  line L1 (0, 48) -> (15, 48) construction
  circle A1 centre (7.5, 30.25) radius 3.175
  circle A2 centre (7.5, -7.5) radius 3.175
  circle A3 centre (7.5, 11.75) radius 3.175
  line L2 (15, -22.5) -> (15, 48) construction
  line L3 (0, 33) -> (15, 33) construction
  line L4 (0, 25.5) -> (15, 25.5) construction
  line L5 (0, 16.5) -> (15, 16.5) construction
  line L6 (0, 27.5) -> (15, 27.5) construction
  line L7 (0, 14.5) -> (15, 14.5) construction
  line L8 (0, 9) -> (15, 9) construction
  line L9 (15, 0) -> (0, 0) construction
  dimension "d317" = 6.35
  dimension "d318" = 7.5
  dimension "d319" = 7.5
  dimension "d354" = 6.35
  dimension "d369" = 6.35
  dimension "d371" = 6.35
  dimension "d377" = 15
  dimension "d378" = 7.5
  dimension "d379" = 9
  dimension "d380" = 2
  dimension "d381" = 2.75
  dimension "d382" = 2
  dimension "d383" = 7.5
  dimension "d384" = 2.75
  dimension "d385" = 7.5
hole "Front Adjustment Hole" at (0, -2.75, -7.5) at (0, -21.25, -7.5) direction (-1, 0, 0) diameter 3.2004 end through all counterbore diameter 6.35 counterbore depth 10.675
hole "Front Mounting Hole" at (0, 7.5, -7.5) at (0, -40.5, -7.5) direction (-1, 0, 0) diameter 3.2004 end through all counterbore diameter 6.35 counterbore depth 10.675
sketch "Sketch33" plane through (0, 15, 0) normal (0, 1, 0) x (1, 0, 0)
  line L0 (-15, 15) -> (-15, 0)
  line L1 (-15, 0) -> (0, 0)
  line L2 (0, 0) -> (0, 15)
  line L3 (0, 15) -> (-15, 15)
  circle A0 centre (-7.5, 7.5) radius 3.175
  dimension "d340" = 6.35
  dimension "d341" = 7.5
  dimension "d342" = 7.5
hole "Top Mounting Hole" at (-7.5, 15, -7.5) direction (0, -1, 0) diameter 3.2004 end through all counterbore diameter 6.35 counterbore depth 61.674
fillet "Fillet2" radius 6.35 2 edges at (-31.5, -3.75, -15) (-31.5, -24.75, -15)
equation "\"d164\" = extrusionWidth"
equation "\"d165\" = extrusionWidth"
equation "\"d166\" = idlerLength"
equation "\"d167\" = d165"
equation "\"d168\" = extrusionOffset"
equation "\"extrusionWidth\" = 15"
equation "\"idlerLength\" = 16.5"
equation "\"bearingOffsetFromBottom\" = 7.5"
equation "\"extrusionOffset\" = 33"
equation "\"bearingStackHeight\" = 9"
equation "\"bearingSlotLength\" = 3.5"
equation "\"bearingClearance\" = 13"
equation "\"pinSupportLength\" = 2"
properties part number "A Idler" material "Aluminum 6061"
